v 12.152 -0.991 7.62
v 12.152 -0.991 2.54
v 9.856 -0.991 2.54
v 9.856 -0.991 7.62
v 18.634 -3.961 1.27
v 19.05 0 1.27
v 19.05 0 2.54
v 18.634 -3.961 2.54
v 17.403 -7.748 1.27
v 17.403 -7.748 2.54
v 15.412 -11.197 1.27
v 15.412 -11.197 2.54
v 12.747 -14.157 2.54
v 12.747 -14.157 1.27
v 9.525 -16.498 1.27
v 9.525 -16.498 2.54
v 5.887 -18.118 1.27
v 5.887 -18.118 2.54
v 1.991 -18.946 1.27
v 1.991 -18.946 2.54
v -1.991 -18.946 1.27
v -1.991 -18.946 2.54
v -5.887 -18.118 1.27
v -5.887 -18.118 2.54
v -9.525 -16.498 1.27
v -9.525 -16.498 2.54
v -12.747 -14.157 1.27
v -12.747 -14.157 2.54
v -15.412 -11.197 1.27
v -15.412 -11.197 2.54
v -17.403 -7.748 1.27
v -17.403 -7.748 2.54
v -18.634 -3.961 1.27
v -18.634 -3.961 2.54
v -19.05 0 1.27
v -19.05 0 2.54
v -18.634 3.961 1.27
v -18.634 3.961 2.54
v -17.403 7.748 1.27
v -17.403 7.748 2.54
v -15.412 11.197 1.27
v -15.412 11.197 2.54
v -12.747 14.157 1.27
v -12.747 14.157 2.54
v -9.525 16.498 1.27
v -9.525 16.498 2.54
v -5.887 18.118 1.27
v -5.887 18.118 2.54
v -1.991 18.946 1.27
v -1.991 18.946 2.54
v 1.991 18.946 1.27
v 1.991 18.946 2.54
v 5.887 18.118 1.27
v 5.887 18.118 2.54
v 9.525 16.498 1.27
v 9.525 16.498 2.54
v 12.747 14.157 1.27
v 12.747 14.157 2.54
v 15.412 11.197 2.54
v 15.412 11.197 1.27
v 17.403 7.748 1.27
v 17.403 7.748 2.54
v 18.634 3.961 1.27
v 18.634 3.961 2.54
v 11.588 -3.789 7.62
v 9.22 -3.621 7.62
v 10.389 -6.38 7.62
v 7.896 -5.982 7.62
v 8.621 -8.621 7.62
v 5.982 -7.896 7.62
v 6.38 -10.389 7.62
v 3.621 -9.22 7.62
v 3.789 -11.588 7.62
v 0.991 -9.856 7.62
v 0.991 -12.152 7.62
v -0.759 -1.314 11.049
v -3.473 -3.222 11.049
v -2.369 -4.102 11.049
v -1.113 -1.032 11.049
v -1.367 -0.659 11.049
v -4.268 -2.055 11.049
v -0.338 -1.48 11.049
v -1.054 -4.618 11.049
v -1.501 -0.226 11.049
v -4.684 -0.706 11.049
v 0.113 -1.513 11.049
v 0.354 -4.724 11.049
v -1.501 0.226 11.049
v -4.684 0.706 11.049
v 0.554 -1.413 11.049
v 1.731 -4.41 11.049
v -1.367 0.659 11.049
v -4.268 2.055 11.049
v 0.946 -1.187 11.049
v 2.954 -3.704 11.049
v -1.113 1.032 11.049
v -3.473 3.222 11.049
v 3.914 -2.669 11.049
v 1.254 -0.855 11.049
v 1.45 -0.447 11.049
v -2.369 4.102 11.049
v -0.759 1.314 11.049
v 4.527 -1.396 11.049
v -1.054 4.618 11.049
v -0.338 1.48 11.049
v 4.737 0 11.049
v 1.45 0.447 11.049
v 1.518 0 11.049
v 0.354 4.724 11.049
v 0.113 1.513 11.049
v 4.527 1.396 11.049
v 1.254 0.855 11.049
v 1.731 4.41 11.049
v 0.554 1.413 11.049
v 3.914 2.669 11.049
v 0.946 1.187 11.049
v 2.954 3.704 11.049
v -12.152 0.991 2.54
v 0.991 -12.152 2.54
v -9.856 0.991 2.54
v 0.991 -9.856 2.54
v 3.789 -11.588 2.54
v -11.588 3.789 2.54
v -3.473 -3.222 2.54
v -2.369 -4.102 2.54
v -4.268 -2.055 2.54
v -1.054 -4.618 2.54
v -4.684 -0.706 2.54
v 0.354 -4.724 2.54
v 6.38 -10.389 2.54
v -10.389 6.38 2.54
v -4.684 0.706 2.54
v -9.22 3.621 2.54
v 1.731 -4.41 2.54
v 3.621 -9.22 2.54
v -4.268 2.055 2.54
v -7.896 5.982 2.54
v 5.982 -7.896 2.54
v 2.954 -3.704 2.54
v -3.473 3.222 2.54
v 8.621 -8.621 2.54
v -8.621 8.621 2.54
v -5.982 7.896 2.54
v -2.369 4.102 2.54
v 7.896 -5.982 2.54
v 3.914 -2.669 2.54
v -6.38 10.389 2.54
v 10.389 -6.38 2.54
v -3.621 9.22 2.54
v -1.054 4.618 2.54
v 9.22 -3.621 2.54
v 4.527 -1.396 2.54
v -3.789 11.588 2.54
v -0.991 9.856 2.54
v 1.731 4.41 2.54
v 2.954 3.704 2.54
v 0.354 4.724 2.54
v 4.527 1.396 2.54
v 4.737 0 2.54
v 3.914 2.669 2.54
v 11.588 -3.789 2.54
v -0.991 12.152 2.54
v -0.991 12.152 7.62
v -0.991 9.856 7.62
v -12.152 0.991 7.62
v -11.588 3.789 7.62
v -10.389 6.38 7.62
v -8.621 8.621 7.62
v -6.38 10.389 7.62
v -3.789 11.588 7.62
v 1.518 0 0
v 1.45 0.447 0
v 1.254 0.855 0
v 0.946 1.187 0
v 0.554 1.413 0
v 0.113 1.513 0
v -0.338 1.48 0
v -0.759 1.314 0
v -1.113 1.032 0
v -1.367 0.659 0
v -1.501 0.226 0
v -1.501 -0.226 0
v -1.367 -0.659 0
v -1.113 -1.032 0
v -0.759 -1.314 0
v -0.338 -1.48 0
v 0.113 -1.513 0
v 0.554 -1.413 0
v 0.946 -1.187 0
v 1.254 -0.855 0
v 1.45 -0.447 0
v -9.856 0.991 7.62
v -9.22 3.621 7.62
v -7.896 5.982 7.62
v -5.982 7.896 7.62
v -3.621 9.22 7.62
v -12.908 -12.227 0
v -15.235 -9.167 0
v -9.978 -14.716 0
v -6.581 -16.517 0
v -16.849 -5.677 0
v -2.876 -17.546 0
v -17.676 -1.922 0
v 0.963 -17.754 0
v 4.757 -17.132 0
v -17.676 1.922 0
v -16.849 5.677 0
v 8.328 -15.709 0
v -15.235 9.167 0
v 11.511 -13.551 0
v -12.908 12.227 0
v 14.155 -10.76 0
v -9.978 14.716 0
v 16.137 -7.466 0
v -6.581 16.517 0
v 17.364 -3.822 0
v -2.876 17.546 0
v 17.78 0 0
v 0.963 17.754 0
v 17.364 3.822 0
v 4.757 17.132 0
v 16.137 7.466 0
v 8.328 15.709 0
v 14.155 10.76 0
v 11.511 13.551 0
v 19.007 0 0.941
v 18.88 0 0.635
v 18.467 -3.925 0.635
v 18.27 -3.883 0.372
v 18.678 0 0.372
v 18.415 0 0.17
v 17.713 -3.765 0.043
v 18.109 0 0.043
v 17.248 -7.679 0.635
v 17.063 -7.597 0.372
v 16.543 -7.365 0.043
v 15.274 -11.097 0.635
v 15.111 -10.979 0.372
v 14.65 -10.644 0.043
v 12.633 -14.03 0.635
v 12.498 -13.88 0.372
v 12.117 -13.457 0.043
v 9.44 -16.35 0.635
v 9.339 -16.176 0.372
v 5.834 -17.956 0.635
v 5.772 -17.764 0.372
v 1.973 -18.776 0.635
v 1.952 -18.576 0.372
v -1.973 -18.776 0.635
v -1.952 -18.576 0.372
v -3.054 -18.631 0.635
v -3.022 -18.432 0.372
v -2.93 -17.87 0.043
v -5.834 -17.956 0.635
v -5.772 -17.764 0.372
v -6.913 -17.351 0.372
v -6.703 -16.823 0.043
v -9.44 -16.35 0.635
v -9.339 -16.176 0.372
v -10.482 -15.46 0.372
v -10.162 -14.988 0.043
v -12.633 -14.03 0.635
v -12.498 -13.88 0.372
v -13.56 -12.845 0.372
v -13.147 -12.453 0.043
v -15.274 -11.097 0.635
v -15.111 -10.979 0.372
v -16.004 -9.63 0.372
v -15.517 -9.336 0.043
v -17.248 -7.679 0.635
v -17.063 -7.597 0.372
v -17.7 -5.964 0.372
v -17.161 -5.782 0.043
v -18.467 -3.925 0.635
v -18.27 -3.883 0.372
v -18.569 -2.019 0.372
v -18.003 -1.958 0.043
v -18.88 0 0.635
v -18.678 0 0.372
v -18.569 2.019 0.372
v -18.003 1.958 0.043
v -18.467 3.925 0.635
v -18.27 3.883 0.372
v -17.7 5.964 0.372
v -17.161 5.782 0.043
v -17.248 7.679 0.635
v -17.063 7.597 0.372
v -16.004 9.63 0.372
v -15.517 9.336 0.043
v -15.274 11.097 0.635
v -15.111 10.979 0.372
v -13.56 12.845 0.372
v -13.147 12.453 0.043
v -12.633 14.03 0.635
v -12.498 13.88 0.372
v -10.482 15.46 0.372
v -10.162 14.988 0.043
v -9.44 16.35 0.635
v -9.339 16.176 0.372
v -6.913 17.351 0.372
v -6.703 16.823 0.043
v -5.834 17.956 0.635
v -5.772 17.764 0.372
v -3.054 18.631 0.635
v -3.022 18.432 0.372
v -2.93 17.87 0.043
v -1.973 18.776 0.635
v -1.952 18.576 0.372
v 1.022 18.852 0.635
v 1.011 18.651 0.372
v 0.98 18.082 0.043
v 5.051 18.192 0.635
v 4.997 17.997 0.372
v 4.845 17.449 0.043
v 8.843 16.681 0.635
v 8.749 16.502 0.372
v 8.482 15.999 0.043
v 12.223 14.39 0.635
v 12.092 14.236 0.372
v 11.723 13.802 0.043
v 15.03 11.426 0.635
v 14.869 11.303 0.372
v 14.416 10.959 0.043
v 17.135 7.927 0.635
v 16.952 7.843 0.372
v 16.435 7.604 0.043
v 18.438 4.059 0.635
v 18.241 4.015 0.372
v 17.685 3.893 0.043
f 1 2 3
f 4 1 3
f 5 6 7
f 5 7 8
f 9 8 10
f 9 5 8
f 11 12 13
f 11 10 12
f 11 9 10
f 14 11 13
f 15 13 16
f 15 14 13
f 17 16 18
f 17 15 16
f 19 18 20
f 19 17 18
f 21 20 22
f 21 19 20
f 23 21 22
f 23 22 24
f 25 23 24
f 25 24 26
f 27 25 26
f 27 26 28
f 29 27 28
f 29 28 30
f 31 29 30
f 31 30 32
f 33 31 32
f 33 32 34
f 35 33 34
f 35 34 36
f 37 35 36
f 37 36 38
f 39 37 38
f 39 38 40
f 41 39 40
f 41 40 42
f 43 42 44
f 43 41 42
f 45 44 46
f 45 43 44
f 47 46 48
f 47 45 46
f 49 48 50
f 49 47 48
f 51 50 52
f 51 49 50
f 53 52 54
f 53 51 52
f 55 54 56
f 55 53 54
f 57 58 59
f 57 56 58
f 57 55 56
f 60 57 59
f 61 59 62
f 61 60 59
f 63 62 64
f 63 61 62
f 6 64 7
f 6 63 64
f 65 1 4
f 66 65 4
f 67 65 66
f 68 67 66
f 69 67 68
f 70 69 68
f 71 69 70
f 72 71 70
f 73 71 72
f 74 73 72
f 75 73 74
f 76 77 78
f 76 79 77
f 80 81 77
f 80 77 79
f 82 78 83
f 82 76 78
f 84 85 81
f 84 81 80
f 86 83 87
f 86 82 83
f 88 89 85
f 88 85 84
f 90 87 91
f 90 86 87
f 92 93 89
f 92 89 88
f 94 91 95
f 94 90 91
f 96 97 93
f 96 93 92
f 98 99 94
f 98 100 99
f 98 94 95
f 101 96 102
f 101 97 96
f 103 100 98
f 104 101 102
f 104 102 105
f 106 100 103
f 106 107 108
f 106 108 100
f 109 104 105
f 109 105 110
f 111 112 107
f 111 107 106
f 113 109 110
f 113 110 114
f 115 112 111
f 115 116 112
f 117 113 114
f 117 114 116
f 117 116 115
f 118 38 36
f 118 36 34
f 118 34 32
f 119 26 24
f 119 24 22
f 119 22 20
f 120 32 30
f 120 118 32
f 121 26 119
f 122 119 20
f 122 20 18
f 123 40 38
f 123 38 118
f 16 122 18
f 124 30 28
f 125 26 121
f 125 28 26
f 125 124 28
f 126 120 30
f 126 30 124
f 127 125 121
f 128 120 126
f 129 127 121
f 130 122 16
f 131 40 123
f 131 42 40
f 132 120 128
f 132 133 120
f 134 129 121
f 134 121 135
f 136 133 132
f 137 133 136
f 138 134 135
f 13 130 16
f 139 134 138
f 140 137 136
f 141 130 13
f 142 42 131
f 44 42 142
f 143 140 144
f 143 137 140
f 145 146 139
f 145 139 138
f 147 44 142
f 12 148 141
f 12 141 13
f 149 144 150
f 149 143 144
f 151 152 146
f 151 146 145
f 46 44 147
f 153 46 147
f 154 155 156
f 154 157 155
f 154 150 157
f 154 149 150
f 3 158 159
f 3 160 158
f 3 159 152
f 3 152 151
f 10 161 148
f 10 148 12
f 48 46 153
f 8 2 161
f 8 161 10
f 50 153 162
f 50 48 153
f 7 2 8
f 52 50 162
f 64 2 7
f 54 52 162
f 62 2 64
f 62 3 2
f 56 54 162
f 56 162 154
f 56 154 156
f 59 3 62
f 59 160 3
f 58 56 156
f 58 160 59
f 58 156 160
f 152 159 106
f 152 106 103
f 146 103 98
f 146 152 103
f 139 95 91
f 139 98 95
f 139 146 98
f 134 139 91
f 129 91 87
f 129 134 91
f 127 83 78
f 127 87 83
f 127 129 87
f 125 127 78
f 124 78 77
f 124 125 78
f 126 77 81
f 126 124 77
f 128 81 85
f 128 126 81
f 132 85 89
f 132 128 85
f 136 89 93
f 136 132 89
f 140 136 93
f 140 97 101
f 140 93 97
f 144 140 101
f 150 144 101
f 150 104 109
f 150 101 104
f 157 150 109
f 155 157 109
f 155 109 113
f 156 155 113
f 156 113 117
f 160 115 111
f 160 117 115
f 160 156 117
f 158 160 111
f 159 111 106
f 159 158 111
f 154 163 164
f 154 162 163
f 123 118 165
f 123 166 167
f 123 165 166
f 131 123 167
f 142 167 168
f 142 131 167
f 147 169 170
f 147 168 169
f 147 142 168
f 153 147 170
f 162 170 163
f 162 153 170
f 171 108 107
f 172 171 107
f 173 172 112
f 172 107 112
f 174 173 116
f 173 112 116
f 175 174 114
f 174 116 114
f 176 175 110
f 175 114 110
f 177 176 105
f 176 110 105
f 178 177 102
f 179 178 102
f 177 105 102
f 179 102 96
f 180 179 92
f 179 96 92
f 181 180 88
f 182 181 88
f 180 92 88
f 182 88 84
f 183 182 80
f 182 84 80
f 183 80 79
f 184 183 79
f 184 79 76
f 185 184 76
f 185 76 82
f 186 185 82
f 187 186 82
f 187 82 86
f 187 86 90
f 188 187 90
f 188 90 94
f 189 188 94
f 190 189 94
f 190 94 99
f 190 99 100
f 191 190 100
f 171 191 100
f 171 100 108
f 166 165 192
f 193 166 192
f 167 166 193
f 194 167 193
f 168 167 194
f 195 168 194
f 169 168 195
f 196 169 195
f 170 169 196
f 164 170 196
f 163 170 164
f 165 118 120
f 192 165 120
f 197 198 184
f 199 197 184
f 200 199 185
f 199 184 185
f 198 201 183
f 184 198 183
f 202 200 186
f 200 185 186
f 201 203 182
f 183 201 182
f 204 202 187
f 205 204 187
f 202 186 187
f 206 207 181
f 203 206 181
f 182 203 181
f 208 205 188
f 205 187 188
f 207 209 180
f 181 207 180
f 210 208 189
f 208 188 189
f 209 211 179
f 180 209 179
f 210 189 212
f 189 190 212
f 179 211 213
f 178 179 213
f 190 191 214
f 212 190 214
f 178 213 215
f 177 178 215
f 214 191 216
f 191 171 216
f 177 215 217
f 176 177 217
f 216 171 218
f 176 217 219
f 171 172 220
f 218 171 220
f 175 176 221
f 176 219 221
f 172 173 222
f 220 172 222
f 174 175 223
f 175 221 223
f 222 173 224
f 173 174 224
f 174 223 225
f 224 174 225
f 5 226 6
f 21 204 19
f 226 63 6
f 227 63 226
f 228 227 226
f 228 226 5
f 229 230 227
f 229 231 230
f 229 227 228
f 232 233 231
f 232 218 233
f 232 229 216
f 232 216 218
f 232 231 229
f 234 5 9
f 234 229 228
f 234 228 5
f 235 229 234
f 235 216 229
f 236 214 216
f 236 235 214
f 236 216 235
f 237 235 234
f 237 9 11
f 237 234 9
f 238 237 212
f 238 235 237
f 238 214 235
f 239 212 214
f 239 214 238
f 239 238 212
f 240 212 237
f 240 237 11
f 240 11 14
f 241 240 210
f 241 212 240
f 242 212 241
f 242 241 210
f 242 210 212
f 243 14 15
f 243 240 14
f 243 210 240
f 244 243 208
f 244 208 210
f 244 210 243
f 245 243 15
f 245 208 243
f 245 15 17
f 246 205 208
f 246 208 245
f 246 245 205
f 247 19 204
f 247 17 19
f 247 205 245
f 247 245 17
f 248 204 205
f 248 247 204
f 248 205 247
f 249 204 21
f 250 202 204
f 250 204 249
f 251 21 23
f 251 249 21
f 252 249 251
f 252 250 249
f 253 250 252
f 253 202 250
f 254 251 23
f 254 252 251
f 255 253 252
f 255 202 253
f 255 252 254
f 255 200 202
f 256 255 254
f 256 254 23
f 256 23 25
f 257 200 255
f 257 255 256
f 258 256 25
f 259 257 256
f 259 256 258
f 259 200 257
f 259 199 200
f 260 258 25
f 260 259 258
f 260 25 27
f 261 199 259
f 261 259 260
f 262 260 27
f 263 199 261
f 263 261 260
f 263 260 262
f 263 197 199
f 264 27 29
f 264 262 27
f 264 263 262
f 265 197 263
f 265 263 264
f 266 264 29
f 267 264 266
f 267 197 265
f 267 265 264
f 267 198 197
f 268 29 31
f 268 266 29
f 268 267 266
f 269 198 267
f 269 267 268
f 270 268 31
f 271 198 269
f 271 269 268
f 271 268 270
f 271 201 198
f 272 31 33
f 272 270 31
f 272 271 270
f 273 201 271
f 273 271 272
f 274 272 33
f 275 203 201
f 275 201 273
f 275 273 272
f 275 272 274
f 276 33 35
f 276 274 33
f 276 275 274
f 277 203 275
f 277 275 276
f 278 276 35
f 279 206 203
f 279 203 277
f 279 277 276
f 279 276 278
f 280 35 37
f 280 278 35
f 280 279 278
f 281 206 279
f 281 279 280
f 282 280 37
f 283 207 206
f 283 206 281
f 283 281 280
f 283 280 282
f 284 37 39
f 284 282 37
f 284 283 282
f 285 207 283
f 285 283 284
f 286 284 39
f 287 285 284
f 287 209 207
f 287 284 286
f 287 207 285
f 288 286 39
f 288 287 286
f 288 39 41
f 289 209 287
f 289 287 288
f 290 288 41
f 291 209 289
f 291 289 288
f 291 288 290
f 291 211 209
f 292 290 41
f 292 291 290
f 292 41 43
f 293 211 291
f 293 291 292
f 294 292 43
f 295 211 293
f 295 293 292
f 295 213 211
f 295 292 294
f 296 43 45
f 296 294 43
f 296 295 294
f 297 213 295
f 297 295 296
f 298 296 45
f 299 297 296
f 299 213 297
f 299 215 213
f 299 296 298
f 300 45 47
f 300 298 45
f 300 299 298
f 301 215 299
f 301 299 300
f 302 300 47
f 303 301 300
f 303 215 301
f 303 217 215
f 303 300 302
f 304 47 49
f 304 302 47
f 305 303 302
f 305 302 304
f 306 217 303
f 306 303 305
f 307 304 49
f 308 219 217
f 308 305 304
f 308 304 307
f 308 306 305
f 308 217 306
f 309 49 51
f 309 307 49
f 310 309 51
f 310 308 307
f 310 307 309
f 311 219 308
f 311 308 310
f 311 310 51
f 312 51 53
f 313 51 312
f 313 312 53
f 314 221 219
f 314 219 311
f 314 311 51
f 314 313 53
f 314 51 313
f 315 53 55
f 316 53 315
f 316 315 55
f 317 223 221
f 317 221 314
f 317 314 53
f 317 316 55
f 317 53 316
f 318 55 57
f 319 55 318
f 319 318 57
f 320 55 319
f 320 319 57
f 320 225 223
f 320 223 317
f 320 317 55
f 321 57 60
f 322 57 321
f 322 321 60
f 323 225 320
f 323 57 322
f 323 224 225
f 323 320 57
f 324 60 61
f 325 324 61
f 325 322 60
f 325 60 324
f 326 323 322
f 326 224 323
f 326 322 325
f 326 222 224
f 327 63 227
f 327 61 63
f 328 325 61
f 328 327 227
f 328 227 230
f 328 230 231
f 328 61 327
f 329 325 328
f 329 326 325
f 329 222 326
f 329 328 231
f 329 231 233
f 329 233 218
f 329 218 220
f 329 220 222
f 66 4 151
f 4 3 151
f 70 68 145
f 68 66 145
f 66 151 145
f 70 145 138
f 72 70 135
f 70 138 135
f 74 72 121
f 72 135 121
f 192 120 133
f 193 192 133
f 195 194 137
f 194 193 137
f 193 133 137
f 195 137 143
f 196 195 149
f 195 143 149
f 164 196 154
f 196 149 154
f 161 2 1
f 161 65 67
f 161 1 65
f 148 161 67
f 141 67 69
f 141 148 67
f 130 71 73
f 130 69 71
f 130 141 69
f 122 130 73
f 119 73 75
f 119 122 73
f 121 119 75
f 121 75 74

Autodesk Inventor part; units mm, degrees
ref_plane "YZ Plane" through (0, 0, 0) normal (1, 0, 0) x (0, 1, 0)
ref_plane "XZ Plane" through (0, 0, 0) normal (0, 1, 0) x (-1, 0, 0)
ref_plane "XY Plane" through (0, 0, 0) normal (0, 0, 1) x (1, 0, 0)
sketch "Sketch1" plane through (0, 0, 0) normal (0, 0, 1) x (1, 0, 0)
  circle A0 centre (0, 0) radius 19.05
  dimension "d0" = 38.1
extrude "Extrusion1" add sketch "Sketch1" along normal blind 2.54
sketch "Sketch2" plane through (0, 0, 2.54) normal (0, 0, 1) x (1, 0, 0)
  circle A0 centre (0, 0) radius 19.05 projected
  circle A1 centre (0, 0) radius 4.7371
  dimension "d3" = 9.4742
extrude "Extrusion2" add sketch "Sketch2" along normal blind 8.509 contours A1
sketch "Sketch3" plane through (0, 0, 11.049) normal (0, 0, 1) x (1, 0, 0)
  circle A0 centre (0, 0) radius 4.7371 projected
  circle A1 centre (0, 0) radius 1.5177
  dimension "d6" = 3.0353
extrude "Extrusion3" cut sketch "Sketch3" against normal through all contours A1
sketch "Sketch4" plane through (0, 0, 2.54) normal (0, 0, 1) x (1, 0, 0)
  circle A0 centre (0, 0) radius 4.7371 projected
  circle A1 centre (0, 0) radius 19.05 projected
  line L0 (-12.1517, 0.9906) -> (-9.8563, 0.9906)
  line L1 (-0.9906, 12.1517) -> (-0.9906, 9.8563)
  arc A2 (-0.9906, 12.1517) -> (-12.1517, 0.9906) centre (0, 0) ccw
  arc A3 (-0.9906, 9.8563) -> (-9.8563, 0.9906) centre (0, 0) ccw
  dimension "d9" = 0.9906
  dimension "d10" = 0.9906
  dimension "d11" = 9.906
  dimension "d12" = 12.192
extrude "Extrusion4" add sketch "Sketch4" along normal blind 5.08 contours A2 L1 A3 L0
pattern_circular "Circular Pattern1" count 2 over 360 about axis through (0, 0, 0) along (0, 0, 1) of "Extrusion4"
fillet "Fillet1" radius 1.27 1 edges at (-19.05, 0, 0)
equation "\"d10\" = d9"
properties part number "Kornylak Wheel Hub - Out Side"
